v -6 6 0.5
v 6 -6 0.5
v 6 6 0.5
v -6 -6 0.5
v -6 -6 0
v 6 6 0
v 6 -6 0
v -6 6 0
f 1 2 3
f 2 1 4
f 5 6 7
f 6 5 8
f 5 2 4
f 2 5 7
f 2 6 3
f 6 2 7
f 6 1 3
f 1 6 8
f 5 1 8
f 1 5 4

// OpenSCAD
module base(){
    color( [1, 1, 1, 1]) //white HDPE
    {
        translate([0,0,1/4])
        cube(size = [12,12,1/2], center = true);
    }
}
base();
